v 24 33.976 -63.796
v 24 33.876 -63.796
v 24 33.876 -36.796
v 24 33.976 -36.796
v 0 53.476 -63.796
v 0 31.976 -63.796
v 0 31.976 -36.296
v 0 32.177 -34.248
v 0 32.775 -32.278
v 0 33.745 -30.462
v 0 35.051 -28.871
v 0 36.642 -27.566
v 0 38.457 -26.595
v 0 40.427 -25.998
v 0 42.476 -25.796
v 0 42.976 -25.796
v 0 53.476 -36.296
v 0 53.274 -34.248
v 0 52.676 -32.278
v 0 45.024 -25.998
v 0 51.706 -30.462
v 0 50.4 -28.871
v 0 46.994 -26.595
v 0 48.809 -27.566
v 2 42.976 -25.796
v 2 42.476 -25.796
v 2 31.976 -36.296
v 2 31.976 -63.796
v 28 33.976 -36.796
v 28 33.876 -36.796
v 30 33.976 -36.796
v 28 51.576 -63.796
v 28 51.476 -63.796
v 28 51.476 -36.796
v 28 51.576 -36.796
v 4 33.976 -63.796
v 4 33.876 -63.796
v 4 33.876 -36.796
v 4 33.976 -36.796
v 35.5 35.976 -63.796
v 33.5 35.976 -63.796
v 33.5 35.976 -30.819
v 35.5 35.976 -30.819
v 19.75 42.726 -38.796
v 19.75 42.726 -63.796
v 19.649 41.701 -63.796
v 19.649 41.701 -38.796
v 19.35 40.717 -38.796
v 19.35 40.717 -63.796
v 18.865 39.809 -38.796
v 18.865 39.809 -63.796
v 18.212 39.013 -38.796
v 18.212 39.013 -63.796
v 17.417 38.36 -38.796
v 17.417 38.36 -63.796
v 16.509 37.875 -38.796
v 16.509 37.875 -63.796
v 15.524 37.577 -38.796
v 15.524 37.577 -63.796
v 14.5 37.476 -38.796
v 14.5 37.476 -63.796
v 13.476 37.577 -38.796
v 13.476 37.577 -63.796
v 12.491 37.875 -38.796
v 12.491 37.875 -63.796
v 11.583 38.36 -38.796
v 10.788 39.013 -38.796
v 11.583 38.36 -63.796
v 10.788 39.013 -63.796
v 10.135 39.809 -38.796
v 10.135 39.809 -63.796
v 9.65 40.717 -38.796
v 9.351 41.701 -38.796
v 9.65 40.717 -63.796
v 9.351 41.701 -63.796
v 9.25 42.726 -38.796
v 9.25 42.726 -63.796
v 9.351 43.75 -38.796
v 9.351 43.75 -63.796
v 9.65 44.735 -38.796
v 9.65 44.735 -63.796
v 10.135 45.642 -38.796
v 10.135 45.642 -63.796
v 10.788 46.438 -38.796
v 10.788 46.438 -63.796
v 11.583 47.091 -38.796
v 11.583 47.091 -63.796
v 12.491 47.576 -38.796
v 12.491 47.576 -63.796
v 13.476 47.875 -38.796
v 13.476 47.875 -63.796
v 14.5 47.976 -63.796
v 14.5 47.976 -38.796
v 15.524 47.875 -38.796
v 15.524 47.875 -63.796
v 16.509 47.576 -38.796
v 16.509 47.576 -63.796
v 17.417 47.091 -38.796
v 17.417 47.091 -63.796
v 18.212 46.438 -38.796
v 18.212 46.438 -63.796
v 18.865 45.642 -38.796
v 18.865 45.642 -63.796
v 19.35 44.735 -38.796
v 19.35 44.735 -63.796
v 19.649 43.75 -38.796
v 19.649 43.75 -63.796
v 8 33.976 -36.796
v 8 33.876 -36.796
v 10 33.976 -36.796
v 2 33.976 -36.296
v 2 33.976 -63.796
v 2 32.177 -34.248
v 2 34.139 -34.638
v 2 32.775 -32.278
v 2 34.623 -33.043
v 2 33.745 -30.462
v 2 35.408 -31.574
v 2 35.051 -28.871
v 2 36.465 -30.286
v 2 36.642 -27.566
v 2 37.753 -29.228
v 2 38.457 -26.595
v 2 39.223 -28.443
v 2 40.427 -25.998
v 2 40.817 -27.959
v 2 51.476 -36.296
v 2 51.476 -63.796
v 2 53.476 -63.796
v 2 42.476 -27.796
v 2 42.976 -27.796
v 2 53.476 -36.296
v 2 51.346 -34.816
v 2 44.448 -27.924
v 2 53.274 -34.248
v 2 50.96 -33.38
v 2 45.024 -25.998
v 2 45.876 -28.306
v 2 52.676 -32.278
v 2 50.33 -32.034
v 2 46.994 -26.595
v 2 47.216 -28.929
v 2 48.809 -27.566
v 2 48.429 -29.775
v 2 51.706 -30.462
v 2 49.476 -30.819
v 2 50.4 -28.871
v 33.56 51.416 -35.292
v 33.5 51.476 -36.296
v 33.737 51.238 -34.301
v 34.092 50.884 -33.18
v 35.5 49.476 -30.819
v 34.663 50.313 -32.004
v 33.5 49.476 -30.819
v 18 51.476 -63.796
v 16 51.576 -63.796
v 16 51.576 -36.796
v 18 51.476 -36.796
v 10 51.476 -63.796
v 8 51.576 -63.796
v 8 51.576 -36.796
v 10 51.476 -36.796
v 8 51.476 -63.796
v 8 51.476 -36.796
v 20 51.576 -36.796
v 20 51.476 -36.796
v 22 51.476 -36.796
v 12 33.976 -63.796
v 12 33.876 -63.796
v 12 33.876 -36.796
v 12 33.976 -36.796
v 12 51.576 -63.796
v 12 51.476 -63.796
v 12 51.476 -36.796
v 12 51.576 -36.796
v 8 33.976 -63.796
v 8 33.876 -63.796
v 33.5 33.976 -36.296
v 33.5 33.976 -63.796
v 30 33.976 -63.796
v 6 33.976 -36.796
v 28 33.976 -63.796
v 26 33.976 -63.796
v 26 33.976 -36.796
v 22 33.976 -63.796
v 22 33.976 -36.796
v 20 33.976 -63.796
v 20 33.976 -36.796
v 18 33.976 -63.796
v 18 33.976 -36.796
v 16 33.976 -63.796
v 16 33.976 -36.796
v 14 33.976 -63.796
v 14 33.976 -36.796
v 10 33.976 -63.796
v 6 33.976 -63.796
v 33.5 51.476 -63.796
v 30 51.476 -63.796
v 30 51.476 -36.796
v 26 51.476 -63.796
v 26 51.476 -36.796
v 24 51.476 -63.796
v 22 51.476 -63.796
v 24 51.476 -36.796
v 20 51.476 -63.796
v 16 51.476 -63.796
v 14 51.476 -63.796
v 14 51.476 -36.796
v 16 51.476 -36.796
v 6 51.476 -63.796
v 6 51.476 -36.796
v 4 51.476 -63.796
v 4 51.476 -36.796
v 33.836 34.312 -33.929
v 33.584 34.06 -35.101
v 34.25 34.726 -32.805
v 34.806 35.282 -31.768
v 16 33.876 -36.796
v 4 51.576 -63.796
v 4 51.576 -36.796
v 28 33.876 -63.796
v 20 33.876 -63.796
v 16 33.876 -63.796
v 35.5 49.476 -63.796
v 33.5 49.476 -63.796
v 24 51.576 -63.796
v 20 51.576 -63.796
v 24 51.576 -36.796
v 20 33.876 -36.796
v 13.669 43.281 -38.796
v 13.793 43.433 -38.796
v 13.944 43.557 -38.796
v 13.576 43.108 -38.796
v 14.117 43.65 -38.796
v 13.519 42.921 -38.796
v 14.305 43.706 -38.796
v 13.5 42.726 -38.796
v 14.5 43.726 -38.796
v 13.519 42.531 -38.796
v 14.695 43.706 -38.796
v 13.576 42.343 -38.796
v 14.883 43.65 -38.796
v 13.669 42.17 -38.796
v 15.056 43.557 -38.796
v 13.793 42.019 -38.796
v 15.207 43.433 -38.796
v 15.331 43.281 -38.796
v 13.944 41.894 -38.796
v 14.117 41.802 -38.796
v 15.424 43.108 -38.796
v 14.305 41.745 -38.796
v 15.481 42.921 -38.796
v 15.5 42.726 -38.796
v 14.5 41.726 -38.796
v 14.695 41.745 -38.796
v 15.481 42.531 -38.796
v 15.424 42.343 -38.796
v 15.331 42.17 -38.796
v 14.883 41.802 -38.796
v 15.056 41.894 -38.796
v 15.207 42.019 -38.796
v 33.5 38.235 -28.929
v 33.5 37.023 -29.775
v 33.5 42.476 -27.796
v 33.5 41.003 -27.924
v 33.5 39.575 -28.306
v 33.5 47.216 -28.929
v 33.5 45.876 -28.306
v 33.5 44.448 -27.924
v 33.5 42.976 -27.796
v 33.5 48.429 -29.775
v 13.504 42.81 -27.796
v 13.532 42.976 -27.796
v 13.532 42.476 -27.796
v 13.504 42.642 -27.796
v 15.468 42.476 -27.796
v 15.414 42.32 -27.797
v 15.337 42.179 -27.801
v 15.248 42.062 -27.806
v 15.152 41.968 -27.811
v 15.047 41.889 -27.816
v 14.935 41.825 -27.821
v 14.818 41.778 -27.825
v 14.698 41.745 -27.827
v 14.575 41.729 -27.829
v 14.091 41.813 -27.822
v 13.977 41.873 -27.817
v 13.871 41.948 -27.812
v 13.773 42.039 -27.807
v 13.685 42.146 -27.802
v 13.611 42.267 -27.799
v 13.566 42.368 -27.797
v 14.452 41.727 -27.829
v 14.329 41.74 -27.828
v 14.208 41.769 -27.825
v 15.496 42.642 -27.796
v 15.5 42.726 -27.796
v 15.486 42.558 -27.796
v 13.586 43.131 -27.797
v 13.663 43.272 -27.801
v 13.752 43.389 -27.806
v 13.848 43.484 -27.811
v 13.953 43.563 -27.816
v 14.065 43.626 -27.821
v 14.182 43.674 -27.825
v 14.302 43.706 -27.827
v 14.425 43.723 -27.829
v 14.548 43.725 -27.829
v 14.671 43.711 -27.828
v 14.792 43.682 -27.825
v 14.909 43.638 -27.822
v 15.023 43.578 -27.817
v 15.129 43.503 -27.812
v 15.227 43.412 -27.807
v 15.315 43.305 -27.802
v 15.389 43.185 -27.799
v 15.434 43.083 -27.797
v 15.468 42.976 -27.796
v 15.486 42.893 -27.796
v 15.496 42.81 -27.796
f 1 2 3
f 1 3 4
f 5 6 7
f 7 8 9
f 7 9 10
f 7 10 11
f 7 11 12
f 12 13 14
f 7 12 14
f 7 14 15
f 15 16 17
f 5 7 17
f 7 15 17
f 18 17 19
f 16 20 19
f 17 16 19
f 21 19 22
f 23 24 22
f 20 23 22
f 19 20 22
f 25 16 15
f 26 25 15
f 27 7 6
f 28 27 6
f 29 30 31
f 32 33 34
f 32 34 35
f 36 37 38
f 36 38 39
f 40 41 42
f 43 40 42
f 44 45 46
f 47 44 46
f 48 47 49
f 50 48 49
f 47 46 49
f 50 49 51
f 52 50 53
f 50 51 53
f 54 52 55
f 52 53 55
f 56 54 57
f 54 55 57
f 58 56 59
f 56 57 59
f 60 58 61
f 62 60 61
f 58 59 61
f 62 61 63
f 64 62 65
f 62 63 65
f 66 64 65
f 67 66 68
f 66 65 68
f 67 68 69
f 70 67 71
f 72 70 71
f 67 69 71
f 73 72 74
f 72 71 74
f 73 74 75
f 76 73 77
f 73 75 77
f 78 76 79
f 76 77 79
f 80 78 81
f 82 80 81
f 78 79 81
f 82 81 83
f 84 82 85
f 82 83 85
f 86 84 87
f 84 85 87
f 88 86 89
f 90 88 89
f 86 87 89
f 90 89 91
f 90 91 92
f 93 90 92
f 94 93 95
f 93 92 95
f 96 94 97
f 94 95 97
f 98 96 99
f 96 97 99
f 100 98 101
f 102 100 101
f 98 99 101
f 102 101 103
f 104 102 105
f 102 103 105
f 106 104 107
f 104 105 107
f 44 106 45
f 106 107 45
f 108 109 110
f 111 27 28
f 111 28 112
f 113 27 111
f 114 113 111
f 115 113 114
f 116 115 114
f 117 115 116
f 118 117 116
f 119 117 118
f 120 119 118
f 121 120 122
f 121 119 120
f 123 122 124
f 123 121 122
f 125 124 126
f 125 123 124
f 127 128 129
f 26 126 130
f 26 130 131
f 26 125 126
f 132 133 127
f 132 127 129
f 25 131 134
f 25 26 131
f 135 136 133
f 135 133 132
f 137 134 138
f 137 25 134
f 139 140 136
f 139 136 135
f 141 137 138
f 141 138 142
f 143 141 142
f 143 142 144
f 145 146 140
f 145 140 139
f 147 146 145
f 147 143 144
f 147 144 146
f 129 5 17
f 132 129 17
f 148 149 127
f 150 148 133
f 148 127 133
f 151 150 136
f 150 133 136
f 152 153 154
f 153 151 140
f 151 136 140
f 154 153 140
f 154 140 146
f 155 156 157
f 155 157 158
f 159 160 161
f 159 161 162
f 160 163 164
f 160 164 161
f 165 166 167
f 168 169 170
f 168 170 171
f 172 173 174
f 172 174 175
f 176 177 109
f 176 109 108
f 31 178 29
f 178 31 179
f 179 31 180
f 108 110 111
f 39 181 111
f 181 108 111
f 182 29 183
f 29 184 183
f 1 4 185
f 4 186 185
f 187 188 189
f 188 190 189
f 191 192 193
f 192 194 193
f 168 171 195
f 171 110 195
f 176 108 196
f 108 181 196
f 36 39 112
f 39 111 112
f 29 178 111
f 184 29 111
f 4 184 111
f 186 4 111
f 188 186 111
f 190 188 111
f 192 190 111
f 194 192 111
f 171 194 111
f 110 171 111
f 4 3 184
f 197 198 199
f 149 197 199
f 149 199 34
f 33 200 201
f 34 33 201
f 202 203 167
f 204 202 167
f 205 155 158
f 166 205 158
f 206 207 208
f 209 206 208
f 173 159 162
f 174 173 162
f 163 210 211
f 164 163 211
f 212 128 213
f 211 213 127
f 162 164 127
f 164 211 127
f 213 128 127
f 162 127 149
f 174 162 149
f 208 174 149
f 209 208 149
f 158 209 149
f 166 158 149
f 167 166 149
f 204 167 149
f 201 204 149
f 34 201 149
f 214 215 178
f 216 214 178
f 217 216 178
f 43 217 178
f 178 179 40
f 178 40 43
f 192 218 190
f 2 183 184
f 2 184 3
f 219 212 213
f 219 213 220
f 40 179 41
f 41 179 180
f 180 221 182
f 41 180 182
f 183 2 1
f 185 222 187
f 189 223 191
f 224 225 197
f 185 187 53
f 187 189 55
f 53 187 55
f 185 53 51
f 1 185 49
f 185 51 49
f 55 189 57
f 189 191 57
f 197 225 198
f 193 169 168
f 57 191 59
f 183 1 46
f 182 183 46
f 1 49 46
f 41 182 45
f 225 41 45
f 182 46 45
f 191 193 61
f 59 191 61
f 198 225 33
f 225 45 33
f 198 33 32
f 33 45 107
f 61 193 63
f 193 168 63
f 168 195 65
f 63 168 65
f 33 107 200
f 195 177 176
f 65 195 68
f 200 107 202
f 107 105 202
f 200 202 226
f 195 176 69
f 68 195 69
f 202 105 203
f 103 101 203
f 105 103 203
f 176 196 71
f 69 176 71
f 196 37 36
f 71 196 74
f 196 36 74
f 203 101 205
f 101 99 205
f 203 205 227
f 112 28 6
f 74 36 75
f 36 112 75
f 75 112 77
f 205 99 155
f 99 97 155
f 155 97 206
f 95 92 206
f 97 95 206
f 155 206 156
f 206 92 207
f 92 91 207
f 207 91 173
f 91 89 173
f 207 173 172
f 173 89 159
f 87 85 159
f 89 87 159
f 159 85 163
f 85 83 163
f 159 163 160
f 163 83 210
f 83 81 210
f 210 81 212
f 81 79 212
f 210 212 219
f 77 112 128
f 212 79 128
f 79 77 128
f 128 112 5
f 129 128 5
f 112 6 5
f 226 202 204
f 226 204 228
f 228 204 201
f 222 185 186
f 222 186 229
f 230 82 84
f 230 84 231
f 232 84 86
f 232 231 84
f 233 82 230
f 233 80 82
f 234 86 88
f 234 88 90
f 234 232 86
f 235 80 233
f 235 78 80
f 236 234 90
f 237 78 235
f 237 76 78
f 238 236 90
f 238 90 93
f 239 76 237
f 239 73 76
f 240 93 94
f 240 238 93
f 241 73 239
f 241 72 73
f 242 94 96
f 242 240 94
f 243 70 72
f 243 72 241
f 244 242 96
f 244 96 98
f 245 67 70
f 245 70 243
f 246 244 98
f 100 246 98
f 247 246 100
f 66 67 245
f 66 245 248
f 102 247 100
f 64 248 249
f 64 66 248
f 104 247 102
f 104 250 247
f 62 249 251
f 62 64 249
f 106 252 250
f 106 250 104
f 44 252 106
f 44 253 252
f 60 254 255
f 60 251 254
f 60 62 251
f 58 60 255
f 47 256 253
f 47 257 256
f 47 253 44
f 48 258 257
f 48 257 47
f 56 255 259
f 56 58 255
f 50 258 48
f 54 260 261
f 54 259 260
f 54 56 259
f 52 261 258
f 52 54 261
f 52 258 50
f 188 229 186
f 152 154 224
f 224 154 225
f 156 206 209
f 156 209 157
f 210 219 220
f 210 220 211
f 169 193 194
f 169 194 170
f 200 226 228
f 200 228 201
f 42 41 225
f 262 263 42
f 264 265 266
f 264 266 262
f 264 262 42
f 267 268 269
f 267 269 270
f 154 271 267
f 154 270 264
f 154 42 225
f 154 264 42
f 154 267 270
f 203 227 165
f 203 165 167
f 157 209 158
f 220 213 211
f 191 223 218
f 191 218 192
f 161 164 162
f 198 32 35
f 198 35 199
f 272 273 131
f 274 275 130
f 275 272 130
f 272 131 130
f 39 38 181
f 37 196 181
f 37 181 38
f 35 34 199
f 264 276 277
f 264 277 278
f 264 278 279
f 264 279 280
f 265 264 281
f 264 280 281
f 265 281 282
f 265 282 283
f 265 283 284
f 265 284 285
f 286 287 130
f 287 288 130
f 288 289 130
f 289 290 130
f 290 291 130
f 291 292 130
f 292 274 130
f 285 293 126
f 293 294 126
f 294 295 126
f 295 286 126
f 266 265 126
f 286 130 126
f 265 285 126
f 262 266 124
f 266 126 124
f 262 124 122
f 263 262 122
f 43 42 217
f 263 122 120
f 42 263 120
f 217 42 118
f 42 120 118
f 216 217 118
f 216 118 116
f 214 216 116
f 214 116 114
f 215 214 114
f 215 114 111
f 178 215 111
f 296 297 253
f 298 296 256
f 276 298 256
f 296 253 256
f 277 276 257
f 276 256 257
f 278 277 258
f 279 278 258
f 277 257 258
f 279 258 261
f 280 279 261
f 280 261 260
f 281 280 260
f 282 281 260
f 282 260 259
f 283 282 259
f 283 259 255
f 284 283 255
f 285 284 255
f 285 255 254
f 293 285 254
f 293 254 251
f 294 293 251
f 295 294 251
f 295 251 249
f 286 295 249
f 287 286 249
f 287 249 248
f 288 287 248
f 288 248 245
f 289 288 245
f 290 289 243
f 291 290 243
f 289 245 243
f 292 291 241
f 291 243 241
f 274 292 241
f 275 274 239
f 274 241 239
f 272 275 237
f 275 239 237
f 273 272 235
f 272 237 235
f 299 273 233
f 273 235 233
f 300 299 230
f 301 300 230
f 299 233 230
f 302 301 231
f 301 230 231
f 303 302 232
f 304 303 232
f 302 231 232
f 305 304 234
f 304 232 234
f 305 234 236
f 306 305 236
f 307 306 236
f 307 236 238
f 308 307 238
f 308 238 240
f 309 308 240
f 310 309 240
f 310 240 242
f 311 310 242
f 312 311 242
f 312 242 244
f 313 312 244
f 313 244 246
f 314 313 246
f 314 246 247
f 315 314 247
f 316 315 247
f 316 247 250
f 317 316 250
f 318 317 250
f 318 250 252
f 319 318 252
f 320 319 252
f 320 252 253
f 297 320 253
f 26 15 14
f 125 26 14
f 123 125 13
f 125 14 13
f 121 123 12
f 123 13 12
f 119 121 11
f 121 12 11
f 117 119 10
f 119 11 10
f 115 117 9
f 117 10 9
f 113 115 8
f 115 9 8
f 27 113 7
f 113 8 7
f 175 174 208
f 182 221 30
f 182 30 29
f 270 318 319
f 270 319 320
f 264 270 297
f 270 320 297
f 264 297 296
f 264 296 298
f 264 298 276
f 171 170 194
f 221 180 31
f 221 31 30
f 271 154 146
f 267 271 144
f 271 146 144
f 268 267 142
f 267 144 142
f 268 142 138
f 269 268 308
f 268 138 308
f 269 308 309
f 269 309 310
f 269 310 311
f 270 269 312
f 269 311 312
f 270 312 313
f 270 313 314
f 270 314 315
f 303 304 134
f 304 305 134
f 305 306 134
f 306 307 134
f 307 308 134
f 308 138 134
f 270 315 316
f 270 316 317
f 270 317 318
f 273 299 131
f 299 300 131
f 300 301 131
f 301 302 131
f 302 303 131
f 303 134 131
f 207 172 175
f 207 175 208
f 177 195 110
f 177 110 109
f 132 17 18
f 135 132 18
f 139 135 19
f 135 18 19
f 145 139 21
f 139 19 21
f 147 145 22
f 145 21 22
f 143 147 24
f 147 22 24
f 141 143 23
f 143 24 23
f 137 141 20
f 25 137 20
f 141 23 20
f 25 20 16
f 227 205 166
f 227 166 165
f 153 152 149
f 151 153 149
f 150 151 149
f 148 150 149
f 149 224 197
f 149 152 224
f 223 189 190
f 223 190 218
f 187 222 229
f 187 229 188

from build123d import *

# Parameters (mm, degrees)
F1_DEPTH = 35.5
F2_DEPTH = 2
F3_DEPTH = 33.5
F4_R     = 5.25
F4_R_2   = 1
F5_DEPTH = 25
F6_DEPTH = 36
F7_DEPTH = 32.9782255751
F8_DEPTH = 27


with BuildPart() as f1:
    # F0 (on Right) → F1 (new body)
    with BuildSketch(Plane.YZ):
        with BuildLine():
            Line((49.4756655051, -63.7959514514), (51.4756655051, -63.7959514514))
            Line((51.4756655051, -63.7959514514), (51.4756655051, -36.2959514514))
            ThreePointArc((51.4756655051, -36.2959514514), (50.9600252165, -33.3804755039), (49.4756655051, -30.8187258763))
            Line((49.4756655051, -30.8187258763), (49.4756655051, -63.7959514514))
        make_face()
    extrude(amount=F1_DEPTH)



with BuildPart() as f1b:
    # F0 (on Right) → F1, piece 2 (new body)
    with BuildSketch(Plane.YZ):
        with BuildLine():
            Line((33.9756655051, -63.7959514514), (35.9756655051, -63.7959514514))
            Line((35.9756655051, -63.7959514514), (35.9756655051, -30.8187258763))
            ThreePointArc((35.9756655051, -30.8187258763), (34.4913057938, -33.3804755039), (33.9756655051, -36.2959514514))
            Line((33.9756655051, -36.2959514514), (33.9756655051, -63.7959514514))
        make_face()
    extrude(amount=F1_DEPTH)


with BuildPart() as f1_1:
    add(f1.part)

    add(f1b.part)  # F2 merges F1b
    # F0 (on Right) → F2 (join)
    with BuildSketch(Plane.YZ):
        with BuildLine():
            Line((51.4756655051, -36.2959514514), (51.4756655051, -63.7959514514))
            Line((51.4756655051, -63.7959514514), (53.4756655051, -63.7959514514))
            Line((53.4756655051, -63.7959514514), (53.4756655051, -36.2959514514))
            ThreePointArc((53.4756655051, -36.2959514514), (50.4002867076, -28.8713302489), (42.9756655051, -25.7959514514))
            Line((42.9756655051, -25.7959514514), (42.4756655051, -25.7959514514))
            ThreePointArc((42.4756655051, -25.7959514514), (35.0510443027, -28.8713302489), (31.9756655051, -36.2959514514))
            Line((31.9756655051, -36.2959514514), (31.9756655051, -63.7959514514))
            Line((31.9756655051, -63.7959514514), (33.9756655051, -63.7959514514))
            Line((33.9756655051, -63.7959514514), (33.9756655051, -36.2959514514))
            ThreePointArc((33.9756655051, -36.2959514514), (34.4913057938, -33.3804755039), (35.9756655051, -30.8187258763))
            ThreePointArc((35.9756655051, -30.8187258763), (38.8914234226, -28.5886037432), (42.4756655051, -27.7959514514))
            Line((42.4756655051, -27.7959514514), (42.9756655051, -27.7959514514))
            ThreePointArc((42.9756655051, -27.7959514514), (46.5599075877, -28.5886037432), (49.4756655051, -30.8187258763))
            ThreePointArc((49.4756655051, -30.8187258763), (50.9600252165, -33.3804755039), (51.4756655051, -36.2959514514))
        make_face()
        with BuildLine():
            Line((35.9756655051, -63.7959514514), (49.4756655051, -63.7959514514))
            Line((49.4756655051, -63.7959514514), (49.4756655051, -30.8187258763))
            ThreePointArc((49.4756655051, -30.8187258763), (46.5599075877, -28.5886037432), (42.9756655051, -27.7959514514))
            Line((42.9756655051, -27.7959514514), (42.4756655051, -27.7959514514))
            ThreePointArc((42.4756655051, -27.7959514514), (38.8914234226, -28.5886037432), (35.9756655051, -30.8187258763))
            Line((35.9756655051, -30.8187258763), (35.9756655051, -63.7959514514))
        make_face()
    extrude(amount=F2_DEPTH)

    # F0 (on Right) → F3 (join)
    with BuildSketch(Plane.YZ):
        with BuildLine():
            Line((35.9756655051, -63.7959514514), (49.4756655051, -63.7959514514))
            Line((49.4756655051, -63.7959514514), (49.4756655051, -30.8187258763))
            ThreePointArc((49.4756655051, -30.8187258763), (46.5599075877, -28.5886037432), (42.9756655051, -27.7959514514))
            Line((42.9756655051, -27.7959514514), (42.4756655051, -27.7959514514))
            ThreePointArc((42.4756655051, -27.7959514514), (38.8914234226, -28.5886037432), (35.9756655051, -30.8187258763))
            Line((35.9756655051, -30.8187258763), (35.9756655051, -63.7959514514))
        make_face()
    extrude(amount=F3_DEPTH)

    # F4 (on face) → F5 (cut)
    with BuildSketch(Plane(origin=(0, 0, -63.7959514514), x_dir=(1, 0, 0), z_dir=(0, 0, -1))):
        with Locations((14.5, -42.7256655051)):
            Circle(F4_R)
        with Locations((14.5, -42.7256655051)):
            Circle(F4_R_2, mode=Mode.SUBTRACT)
    extrude(amount=-F5_DEPTH, mode=Mode.SUBTRACT)

    # F6 (cut, through all): a face of the model
    f6_faces = [f1_1.faces().sort_by_distance(p)[0] for p in [
        (14.5, 42.7256655051, -63.7959514514),
    ]]
    extrude(f6_faces, amount=-F6_DEPTH, mode=Mode.SUBTRACT)

    # F4 (on face) → F7 (cut, through all)
    with BuildSketch(Plane(origin=(0, 0, -63.7959514514), x_dir=(1, 0, 0), z_dir=(0, 0, -1))):
        Polygon((35.5, -49.4756655051), (33.5, -51.4756655051), (35.5, -51.4756655051), align=None)
        Polygon((35.5, -33.9756655051), (33.5, -33.9756655051), (35.5, -35.9756655051), align=None)
    extrude(amount=-F7_DEPTH, mode=Mode.SUBTRACT)

    # F4 (on face) → F8 (join)
    with BuildSketch(Plane(origin=(0, 0, -63.7959514514), x_dir=(1, 0, 0), z_dir=(0, 0, -1))):
        Polygon((4, -51.5756655051), (6, -51.4756655051), (4, -51.4756655051), align=None)
        Polygon((8, -51.5756655051), (10, -51.4756655051), (8, -51.4756655051), align=None)
        Polygon((28, -51.5756655051), (30, -51.4756655051), (28, -51.4756655051), align=None)
        Polygon((24, -51.5756655051), (26, -51.4756655051), (24, -51.4756655051), align=None)
        Polygon((20, -51.5756655051), (22, -51.4756655051), (20, -51.4756655051), align=None)
        Polygon((16, -51.5756655051), (18, -51.4756655051), (16, -51.4756655051), align=None)
        Polygon((12, -51.5756655051), (14, -51.4756655051), (12, -51.4756655051), align=None)
        Polygon((28, -33.9756655051), (30, -33.9756655051), (28, -33.8756655051), align=None)
        Polygon((24, -33.9756655051), (26, -33.9756655051), (24, -33.8756655051), align=None)
        Polygon((20, -33.9756655051), (22, -33.9756655051), (20, -33.8756655051), align=None)
        Polygon((16, -33.9756655051), (18, -33.9756655051), (16, -33.8756655051), align=None)
        Polygon((12, -33.9756655051), (14, -33.9756655051), (12, -33.8756655051), align=None)
        Polygon((8, -33.9756655051), (10, -33.9756655051), (8, -33.8756655051), align=None)
        Polygon((4, -33.9756655051), (6, -33.9756655051), (4, -33.8756655051), align=None)
    extrude(amount=-F8_DEPTH)


solid = f1_1.part
